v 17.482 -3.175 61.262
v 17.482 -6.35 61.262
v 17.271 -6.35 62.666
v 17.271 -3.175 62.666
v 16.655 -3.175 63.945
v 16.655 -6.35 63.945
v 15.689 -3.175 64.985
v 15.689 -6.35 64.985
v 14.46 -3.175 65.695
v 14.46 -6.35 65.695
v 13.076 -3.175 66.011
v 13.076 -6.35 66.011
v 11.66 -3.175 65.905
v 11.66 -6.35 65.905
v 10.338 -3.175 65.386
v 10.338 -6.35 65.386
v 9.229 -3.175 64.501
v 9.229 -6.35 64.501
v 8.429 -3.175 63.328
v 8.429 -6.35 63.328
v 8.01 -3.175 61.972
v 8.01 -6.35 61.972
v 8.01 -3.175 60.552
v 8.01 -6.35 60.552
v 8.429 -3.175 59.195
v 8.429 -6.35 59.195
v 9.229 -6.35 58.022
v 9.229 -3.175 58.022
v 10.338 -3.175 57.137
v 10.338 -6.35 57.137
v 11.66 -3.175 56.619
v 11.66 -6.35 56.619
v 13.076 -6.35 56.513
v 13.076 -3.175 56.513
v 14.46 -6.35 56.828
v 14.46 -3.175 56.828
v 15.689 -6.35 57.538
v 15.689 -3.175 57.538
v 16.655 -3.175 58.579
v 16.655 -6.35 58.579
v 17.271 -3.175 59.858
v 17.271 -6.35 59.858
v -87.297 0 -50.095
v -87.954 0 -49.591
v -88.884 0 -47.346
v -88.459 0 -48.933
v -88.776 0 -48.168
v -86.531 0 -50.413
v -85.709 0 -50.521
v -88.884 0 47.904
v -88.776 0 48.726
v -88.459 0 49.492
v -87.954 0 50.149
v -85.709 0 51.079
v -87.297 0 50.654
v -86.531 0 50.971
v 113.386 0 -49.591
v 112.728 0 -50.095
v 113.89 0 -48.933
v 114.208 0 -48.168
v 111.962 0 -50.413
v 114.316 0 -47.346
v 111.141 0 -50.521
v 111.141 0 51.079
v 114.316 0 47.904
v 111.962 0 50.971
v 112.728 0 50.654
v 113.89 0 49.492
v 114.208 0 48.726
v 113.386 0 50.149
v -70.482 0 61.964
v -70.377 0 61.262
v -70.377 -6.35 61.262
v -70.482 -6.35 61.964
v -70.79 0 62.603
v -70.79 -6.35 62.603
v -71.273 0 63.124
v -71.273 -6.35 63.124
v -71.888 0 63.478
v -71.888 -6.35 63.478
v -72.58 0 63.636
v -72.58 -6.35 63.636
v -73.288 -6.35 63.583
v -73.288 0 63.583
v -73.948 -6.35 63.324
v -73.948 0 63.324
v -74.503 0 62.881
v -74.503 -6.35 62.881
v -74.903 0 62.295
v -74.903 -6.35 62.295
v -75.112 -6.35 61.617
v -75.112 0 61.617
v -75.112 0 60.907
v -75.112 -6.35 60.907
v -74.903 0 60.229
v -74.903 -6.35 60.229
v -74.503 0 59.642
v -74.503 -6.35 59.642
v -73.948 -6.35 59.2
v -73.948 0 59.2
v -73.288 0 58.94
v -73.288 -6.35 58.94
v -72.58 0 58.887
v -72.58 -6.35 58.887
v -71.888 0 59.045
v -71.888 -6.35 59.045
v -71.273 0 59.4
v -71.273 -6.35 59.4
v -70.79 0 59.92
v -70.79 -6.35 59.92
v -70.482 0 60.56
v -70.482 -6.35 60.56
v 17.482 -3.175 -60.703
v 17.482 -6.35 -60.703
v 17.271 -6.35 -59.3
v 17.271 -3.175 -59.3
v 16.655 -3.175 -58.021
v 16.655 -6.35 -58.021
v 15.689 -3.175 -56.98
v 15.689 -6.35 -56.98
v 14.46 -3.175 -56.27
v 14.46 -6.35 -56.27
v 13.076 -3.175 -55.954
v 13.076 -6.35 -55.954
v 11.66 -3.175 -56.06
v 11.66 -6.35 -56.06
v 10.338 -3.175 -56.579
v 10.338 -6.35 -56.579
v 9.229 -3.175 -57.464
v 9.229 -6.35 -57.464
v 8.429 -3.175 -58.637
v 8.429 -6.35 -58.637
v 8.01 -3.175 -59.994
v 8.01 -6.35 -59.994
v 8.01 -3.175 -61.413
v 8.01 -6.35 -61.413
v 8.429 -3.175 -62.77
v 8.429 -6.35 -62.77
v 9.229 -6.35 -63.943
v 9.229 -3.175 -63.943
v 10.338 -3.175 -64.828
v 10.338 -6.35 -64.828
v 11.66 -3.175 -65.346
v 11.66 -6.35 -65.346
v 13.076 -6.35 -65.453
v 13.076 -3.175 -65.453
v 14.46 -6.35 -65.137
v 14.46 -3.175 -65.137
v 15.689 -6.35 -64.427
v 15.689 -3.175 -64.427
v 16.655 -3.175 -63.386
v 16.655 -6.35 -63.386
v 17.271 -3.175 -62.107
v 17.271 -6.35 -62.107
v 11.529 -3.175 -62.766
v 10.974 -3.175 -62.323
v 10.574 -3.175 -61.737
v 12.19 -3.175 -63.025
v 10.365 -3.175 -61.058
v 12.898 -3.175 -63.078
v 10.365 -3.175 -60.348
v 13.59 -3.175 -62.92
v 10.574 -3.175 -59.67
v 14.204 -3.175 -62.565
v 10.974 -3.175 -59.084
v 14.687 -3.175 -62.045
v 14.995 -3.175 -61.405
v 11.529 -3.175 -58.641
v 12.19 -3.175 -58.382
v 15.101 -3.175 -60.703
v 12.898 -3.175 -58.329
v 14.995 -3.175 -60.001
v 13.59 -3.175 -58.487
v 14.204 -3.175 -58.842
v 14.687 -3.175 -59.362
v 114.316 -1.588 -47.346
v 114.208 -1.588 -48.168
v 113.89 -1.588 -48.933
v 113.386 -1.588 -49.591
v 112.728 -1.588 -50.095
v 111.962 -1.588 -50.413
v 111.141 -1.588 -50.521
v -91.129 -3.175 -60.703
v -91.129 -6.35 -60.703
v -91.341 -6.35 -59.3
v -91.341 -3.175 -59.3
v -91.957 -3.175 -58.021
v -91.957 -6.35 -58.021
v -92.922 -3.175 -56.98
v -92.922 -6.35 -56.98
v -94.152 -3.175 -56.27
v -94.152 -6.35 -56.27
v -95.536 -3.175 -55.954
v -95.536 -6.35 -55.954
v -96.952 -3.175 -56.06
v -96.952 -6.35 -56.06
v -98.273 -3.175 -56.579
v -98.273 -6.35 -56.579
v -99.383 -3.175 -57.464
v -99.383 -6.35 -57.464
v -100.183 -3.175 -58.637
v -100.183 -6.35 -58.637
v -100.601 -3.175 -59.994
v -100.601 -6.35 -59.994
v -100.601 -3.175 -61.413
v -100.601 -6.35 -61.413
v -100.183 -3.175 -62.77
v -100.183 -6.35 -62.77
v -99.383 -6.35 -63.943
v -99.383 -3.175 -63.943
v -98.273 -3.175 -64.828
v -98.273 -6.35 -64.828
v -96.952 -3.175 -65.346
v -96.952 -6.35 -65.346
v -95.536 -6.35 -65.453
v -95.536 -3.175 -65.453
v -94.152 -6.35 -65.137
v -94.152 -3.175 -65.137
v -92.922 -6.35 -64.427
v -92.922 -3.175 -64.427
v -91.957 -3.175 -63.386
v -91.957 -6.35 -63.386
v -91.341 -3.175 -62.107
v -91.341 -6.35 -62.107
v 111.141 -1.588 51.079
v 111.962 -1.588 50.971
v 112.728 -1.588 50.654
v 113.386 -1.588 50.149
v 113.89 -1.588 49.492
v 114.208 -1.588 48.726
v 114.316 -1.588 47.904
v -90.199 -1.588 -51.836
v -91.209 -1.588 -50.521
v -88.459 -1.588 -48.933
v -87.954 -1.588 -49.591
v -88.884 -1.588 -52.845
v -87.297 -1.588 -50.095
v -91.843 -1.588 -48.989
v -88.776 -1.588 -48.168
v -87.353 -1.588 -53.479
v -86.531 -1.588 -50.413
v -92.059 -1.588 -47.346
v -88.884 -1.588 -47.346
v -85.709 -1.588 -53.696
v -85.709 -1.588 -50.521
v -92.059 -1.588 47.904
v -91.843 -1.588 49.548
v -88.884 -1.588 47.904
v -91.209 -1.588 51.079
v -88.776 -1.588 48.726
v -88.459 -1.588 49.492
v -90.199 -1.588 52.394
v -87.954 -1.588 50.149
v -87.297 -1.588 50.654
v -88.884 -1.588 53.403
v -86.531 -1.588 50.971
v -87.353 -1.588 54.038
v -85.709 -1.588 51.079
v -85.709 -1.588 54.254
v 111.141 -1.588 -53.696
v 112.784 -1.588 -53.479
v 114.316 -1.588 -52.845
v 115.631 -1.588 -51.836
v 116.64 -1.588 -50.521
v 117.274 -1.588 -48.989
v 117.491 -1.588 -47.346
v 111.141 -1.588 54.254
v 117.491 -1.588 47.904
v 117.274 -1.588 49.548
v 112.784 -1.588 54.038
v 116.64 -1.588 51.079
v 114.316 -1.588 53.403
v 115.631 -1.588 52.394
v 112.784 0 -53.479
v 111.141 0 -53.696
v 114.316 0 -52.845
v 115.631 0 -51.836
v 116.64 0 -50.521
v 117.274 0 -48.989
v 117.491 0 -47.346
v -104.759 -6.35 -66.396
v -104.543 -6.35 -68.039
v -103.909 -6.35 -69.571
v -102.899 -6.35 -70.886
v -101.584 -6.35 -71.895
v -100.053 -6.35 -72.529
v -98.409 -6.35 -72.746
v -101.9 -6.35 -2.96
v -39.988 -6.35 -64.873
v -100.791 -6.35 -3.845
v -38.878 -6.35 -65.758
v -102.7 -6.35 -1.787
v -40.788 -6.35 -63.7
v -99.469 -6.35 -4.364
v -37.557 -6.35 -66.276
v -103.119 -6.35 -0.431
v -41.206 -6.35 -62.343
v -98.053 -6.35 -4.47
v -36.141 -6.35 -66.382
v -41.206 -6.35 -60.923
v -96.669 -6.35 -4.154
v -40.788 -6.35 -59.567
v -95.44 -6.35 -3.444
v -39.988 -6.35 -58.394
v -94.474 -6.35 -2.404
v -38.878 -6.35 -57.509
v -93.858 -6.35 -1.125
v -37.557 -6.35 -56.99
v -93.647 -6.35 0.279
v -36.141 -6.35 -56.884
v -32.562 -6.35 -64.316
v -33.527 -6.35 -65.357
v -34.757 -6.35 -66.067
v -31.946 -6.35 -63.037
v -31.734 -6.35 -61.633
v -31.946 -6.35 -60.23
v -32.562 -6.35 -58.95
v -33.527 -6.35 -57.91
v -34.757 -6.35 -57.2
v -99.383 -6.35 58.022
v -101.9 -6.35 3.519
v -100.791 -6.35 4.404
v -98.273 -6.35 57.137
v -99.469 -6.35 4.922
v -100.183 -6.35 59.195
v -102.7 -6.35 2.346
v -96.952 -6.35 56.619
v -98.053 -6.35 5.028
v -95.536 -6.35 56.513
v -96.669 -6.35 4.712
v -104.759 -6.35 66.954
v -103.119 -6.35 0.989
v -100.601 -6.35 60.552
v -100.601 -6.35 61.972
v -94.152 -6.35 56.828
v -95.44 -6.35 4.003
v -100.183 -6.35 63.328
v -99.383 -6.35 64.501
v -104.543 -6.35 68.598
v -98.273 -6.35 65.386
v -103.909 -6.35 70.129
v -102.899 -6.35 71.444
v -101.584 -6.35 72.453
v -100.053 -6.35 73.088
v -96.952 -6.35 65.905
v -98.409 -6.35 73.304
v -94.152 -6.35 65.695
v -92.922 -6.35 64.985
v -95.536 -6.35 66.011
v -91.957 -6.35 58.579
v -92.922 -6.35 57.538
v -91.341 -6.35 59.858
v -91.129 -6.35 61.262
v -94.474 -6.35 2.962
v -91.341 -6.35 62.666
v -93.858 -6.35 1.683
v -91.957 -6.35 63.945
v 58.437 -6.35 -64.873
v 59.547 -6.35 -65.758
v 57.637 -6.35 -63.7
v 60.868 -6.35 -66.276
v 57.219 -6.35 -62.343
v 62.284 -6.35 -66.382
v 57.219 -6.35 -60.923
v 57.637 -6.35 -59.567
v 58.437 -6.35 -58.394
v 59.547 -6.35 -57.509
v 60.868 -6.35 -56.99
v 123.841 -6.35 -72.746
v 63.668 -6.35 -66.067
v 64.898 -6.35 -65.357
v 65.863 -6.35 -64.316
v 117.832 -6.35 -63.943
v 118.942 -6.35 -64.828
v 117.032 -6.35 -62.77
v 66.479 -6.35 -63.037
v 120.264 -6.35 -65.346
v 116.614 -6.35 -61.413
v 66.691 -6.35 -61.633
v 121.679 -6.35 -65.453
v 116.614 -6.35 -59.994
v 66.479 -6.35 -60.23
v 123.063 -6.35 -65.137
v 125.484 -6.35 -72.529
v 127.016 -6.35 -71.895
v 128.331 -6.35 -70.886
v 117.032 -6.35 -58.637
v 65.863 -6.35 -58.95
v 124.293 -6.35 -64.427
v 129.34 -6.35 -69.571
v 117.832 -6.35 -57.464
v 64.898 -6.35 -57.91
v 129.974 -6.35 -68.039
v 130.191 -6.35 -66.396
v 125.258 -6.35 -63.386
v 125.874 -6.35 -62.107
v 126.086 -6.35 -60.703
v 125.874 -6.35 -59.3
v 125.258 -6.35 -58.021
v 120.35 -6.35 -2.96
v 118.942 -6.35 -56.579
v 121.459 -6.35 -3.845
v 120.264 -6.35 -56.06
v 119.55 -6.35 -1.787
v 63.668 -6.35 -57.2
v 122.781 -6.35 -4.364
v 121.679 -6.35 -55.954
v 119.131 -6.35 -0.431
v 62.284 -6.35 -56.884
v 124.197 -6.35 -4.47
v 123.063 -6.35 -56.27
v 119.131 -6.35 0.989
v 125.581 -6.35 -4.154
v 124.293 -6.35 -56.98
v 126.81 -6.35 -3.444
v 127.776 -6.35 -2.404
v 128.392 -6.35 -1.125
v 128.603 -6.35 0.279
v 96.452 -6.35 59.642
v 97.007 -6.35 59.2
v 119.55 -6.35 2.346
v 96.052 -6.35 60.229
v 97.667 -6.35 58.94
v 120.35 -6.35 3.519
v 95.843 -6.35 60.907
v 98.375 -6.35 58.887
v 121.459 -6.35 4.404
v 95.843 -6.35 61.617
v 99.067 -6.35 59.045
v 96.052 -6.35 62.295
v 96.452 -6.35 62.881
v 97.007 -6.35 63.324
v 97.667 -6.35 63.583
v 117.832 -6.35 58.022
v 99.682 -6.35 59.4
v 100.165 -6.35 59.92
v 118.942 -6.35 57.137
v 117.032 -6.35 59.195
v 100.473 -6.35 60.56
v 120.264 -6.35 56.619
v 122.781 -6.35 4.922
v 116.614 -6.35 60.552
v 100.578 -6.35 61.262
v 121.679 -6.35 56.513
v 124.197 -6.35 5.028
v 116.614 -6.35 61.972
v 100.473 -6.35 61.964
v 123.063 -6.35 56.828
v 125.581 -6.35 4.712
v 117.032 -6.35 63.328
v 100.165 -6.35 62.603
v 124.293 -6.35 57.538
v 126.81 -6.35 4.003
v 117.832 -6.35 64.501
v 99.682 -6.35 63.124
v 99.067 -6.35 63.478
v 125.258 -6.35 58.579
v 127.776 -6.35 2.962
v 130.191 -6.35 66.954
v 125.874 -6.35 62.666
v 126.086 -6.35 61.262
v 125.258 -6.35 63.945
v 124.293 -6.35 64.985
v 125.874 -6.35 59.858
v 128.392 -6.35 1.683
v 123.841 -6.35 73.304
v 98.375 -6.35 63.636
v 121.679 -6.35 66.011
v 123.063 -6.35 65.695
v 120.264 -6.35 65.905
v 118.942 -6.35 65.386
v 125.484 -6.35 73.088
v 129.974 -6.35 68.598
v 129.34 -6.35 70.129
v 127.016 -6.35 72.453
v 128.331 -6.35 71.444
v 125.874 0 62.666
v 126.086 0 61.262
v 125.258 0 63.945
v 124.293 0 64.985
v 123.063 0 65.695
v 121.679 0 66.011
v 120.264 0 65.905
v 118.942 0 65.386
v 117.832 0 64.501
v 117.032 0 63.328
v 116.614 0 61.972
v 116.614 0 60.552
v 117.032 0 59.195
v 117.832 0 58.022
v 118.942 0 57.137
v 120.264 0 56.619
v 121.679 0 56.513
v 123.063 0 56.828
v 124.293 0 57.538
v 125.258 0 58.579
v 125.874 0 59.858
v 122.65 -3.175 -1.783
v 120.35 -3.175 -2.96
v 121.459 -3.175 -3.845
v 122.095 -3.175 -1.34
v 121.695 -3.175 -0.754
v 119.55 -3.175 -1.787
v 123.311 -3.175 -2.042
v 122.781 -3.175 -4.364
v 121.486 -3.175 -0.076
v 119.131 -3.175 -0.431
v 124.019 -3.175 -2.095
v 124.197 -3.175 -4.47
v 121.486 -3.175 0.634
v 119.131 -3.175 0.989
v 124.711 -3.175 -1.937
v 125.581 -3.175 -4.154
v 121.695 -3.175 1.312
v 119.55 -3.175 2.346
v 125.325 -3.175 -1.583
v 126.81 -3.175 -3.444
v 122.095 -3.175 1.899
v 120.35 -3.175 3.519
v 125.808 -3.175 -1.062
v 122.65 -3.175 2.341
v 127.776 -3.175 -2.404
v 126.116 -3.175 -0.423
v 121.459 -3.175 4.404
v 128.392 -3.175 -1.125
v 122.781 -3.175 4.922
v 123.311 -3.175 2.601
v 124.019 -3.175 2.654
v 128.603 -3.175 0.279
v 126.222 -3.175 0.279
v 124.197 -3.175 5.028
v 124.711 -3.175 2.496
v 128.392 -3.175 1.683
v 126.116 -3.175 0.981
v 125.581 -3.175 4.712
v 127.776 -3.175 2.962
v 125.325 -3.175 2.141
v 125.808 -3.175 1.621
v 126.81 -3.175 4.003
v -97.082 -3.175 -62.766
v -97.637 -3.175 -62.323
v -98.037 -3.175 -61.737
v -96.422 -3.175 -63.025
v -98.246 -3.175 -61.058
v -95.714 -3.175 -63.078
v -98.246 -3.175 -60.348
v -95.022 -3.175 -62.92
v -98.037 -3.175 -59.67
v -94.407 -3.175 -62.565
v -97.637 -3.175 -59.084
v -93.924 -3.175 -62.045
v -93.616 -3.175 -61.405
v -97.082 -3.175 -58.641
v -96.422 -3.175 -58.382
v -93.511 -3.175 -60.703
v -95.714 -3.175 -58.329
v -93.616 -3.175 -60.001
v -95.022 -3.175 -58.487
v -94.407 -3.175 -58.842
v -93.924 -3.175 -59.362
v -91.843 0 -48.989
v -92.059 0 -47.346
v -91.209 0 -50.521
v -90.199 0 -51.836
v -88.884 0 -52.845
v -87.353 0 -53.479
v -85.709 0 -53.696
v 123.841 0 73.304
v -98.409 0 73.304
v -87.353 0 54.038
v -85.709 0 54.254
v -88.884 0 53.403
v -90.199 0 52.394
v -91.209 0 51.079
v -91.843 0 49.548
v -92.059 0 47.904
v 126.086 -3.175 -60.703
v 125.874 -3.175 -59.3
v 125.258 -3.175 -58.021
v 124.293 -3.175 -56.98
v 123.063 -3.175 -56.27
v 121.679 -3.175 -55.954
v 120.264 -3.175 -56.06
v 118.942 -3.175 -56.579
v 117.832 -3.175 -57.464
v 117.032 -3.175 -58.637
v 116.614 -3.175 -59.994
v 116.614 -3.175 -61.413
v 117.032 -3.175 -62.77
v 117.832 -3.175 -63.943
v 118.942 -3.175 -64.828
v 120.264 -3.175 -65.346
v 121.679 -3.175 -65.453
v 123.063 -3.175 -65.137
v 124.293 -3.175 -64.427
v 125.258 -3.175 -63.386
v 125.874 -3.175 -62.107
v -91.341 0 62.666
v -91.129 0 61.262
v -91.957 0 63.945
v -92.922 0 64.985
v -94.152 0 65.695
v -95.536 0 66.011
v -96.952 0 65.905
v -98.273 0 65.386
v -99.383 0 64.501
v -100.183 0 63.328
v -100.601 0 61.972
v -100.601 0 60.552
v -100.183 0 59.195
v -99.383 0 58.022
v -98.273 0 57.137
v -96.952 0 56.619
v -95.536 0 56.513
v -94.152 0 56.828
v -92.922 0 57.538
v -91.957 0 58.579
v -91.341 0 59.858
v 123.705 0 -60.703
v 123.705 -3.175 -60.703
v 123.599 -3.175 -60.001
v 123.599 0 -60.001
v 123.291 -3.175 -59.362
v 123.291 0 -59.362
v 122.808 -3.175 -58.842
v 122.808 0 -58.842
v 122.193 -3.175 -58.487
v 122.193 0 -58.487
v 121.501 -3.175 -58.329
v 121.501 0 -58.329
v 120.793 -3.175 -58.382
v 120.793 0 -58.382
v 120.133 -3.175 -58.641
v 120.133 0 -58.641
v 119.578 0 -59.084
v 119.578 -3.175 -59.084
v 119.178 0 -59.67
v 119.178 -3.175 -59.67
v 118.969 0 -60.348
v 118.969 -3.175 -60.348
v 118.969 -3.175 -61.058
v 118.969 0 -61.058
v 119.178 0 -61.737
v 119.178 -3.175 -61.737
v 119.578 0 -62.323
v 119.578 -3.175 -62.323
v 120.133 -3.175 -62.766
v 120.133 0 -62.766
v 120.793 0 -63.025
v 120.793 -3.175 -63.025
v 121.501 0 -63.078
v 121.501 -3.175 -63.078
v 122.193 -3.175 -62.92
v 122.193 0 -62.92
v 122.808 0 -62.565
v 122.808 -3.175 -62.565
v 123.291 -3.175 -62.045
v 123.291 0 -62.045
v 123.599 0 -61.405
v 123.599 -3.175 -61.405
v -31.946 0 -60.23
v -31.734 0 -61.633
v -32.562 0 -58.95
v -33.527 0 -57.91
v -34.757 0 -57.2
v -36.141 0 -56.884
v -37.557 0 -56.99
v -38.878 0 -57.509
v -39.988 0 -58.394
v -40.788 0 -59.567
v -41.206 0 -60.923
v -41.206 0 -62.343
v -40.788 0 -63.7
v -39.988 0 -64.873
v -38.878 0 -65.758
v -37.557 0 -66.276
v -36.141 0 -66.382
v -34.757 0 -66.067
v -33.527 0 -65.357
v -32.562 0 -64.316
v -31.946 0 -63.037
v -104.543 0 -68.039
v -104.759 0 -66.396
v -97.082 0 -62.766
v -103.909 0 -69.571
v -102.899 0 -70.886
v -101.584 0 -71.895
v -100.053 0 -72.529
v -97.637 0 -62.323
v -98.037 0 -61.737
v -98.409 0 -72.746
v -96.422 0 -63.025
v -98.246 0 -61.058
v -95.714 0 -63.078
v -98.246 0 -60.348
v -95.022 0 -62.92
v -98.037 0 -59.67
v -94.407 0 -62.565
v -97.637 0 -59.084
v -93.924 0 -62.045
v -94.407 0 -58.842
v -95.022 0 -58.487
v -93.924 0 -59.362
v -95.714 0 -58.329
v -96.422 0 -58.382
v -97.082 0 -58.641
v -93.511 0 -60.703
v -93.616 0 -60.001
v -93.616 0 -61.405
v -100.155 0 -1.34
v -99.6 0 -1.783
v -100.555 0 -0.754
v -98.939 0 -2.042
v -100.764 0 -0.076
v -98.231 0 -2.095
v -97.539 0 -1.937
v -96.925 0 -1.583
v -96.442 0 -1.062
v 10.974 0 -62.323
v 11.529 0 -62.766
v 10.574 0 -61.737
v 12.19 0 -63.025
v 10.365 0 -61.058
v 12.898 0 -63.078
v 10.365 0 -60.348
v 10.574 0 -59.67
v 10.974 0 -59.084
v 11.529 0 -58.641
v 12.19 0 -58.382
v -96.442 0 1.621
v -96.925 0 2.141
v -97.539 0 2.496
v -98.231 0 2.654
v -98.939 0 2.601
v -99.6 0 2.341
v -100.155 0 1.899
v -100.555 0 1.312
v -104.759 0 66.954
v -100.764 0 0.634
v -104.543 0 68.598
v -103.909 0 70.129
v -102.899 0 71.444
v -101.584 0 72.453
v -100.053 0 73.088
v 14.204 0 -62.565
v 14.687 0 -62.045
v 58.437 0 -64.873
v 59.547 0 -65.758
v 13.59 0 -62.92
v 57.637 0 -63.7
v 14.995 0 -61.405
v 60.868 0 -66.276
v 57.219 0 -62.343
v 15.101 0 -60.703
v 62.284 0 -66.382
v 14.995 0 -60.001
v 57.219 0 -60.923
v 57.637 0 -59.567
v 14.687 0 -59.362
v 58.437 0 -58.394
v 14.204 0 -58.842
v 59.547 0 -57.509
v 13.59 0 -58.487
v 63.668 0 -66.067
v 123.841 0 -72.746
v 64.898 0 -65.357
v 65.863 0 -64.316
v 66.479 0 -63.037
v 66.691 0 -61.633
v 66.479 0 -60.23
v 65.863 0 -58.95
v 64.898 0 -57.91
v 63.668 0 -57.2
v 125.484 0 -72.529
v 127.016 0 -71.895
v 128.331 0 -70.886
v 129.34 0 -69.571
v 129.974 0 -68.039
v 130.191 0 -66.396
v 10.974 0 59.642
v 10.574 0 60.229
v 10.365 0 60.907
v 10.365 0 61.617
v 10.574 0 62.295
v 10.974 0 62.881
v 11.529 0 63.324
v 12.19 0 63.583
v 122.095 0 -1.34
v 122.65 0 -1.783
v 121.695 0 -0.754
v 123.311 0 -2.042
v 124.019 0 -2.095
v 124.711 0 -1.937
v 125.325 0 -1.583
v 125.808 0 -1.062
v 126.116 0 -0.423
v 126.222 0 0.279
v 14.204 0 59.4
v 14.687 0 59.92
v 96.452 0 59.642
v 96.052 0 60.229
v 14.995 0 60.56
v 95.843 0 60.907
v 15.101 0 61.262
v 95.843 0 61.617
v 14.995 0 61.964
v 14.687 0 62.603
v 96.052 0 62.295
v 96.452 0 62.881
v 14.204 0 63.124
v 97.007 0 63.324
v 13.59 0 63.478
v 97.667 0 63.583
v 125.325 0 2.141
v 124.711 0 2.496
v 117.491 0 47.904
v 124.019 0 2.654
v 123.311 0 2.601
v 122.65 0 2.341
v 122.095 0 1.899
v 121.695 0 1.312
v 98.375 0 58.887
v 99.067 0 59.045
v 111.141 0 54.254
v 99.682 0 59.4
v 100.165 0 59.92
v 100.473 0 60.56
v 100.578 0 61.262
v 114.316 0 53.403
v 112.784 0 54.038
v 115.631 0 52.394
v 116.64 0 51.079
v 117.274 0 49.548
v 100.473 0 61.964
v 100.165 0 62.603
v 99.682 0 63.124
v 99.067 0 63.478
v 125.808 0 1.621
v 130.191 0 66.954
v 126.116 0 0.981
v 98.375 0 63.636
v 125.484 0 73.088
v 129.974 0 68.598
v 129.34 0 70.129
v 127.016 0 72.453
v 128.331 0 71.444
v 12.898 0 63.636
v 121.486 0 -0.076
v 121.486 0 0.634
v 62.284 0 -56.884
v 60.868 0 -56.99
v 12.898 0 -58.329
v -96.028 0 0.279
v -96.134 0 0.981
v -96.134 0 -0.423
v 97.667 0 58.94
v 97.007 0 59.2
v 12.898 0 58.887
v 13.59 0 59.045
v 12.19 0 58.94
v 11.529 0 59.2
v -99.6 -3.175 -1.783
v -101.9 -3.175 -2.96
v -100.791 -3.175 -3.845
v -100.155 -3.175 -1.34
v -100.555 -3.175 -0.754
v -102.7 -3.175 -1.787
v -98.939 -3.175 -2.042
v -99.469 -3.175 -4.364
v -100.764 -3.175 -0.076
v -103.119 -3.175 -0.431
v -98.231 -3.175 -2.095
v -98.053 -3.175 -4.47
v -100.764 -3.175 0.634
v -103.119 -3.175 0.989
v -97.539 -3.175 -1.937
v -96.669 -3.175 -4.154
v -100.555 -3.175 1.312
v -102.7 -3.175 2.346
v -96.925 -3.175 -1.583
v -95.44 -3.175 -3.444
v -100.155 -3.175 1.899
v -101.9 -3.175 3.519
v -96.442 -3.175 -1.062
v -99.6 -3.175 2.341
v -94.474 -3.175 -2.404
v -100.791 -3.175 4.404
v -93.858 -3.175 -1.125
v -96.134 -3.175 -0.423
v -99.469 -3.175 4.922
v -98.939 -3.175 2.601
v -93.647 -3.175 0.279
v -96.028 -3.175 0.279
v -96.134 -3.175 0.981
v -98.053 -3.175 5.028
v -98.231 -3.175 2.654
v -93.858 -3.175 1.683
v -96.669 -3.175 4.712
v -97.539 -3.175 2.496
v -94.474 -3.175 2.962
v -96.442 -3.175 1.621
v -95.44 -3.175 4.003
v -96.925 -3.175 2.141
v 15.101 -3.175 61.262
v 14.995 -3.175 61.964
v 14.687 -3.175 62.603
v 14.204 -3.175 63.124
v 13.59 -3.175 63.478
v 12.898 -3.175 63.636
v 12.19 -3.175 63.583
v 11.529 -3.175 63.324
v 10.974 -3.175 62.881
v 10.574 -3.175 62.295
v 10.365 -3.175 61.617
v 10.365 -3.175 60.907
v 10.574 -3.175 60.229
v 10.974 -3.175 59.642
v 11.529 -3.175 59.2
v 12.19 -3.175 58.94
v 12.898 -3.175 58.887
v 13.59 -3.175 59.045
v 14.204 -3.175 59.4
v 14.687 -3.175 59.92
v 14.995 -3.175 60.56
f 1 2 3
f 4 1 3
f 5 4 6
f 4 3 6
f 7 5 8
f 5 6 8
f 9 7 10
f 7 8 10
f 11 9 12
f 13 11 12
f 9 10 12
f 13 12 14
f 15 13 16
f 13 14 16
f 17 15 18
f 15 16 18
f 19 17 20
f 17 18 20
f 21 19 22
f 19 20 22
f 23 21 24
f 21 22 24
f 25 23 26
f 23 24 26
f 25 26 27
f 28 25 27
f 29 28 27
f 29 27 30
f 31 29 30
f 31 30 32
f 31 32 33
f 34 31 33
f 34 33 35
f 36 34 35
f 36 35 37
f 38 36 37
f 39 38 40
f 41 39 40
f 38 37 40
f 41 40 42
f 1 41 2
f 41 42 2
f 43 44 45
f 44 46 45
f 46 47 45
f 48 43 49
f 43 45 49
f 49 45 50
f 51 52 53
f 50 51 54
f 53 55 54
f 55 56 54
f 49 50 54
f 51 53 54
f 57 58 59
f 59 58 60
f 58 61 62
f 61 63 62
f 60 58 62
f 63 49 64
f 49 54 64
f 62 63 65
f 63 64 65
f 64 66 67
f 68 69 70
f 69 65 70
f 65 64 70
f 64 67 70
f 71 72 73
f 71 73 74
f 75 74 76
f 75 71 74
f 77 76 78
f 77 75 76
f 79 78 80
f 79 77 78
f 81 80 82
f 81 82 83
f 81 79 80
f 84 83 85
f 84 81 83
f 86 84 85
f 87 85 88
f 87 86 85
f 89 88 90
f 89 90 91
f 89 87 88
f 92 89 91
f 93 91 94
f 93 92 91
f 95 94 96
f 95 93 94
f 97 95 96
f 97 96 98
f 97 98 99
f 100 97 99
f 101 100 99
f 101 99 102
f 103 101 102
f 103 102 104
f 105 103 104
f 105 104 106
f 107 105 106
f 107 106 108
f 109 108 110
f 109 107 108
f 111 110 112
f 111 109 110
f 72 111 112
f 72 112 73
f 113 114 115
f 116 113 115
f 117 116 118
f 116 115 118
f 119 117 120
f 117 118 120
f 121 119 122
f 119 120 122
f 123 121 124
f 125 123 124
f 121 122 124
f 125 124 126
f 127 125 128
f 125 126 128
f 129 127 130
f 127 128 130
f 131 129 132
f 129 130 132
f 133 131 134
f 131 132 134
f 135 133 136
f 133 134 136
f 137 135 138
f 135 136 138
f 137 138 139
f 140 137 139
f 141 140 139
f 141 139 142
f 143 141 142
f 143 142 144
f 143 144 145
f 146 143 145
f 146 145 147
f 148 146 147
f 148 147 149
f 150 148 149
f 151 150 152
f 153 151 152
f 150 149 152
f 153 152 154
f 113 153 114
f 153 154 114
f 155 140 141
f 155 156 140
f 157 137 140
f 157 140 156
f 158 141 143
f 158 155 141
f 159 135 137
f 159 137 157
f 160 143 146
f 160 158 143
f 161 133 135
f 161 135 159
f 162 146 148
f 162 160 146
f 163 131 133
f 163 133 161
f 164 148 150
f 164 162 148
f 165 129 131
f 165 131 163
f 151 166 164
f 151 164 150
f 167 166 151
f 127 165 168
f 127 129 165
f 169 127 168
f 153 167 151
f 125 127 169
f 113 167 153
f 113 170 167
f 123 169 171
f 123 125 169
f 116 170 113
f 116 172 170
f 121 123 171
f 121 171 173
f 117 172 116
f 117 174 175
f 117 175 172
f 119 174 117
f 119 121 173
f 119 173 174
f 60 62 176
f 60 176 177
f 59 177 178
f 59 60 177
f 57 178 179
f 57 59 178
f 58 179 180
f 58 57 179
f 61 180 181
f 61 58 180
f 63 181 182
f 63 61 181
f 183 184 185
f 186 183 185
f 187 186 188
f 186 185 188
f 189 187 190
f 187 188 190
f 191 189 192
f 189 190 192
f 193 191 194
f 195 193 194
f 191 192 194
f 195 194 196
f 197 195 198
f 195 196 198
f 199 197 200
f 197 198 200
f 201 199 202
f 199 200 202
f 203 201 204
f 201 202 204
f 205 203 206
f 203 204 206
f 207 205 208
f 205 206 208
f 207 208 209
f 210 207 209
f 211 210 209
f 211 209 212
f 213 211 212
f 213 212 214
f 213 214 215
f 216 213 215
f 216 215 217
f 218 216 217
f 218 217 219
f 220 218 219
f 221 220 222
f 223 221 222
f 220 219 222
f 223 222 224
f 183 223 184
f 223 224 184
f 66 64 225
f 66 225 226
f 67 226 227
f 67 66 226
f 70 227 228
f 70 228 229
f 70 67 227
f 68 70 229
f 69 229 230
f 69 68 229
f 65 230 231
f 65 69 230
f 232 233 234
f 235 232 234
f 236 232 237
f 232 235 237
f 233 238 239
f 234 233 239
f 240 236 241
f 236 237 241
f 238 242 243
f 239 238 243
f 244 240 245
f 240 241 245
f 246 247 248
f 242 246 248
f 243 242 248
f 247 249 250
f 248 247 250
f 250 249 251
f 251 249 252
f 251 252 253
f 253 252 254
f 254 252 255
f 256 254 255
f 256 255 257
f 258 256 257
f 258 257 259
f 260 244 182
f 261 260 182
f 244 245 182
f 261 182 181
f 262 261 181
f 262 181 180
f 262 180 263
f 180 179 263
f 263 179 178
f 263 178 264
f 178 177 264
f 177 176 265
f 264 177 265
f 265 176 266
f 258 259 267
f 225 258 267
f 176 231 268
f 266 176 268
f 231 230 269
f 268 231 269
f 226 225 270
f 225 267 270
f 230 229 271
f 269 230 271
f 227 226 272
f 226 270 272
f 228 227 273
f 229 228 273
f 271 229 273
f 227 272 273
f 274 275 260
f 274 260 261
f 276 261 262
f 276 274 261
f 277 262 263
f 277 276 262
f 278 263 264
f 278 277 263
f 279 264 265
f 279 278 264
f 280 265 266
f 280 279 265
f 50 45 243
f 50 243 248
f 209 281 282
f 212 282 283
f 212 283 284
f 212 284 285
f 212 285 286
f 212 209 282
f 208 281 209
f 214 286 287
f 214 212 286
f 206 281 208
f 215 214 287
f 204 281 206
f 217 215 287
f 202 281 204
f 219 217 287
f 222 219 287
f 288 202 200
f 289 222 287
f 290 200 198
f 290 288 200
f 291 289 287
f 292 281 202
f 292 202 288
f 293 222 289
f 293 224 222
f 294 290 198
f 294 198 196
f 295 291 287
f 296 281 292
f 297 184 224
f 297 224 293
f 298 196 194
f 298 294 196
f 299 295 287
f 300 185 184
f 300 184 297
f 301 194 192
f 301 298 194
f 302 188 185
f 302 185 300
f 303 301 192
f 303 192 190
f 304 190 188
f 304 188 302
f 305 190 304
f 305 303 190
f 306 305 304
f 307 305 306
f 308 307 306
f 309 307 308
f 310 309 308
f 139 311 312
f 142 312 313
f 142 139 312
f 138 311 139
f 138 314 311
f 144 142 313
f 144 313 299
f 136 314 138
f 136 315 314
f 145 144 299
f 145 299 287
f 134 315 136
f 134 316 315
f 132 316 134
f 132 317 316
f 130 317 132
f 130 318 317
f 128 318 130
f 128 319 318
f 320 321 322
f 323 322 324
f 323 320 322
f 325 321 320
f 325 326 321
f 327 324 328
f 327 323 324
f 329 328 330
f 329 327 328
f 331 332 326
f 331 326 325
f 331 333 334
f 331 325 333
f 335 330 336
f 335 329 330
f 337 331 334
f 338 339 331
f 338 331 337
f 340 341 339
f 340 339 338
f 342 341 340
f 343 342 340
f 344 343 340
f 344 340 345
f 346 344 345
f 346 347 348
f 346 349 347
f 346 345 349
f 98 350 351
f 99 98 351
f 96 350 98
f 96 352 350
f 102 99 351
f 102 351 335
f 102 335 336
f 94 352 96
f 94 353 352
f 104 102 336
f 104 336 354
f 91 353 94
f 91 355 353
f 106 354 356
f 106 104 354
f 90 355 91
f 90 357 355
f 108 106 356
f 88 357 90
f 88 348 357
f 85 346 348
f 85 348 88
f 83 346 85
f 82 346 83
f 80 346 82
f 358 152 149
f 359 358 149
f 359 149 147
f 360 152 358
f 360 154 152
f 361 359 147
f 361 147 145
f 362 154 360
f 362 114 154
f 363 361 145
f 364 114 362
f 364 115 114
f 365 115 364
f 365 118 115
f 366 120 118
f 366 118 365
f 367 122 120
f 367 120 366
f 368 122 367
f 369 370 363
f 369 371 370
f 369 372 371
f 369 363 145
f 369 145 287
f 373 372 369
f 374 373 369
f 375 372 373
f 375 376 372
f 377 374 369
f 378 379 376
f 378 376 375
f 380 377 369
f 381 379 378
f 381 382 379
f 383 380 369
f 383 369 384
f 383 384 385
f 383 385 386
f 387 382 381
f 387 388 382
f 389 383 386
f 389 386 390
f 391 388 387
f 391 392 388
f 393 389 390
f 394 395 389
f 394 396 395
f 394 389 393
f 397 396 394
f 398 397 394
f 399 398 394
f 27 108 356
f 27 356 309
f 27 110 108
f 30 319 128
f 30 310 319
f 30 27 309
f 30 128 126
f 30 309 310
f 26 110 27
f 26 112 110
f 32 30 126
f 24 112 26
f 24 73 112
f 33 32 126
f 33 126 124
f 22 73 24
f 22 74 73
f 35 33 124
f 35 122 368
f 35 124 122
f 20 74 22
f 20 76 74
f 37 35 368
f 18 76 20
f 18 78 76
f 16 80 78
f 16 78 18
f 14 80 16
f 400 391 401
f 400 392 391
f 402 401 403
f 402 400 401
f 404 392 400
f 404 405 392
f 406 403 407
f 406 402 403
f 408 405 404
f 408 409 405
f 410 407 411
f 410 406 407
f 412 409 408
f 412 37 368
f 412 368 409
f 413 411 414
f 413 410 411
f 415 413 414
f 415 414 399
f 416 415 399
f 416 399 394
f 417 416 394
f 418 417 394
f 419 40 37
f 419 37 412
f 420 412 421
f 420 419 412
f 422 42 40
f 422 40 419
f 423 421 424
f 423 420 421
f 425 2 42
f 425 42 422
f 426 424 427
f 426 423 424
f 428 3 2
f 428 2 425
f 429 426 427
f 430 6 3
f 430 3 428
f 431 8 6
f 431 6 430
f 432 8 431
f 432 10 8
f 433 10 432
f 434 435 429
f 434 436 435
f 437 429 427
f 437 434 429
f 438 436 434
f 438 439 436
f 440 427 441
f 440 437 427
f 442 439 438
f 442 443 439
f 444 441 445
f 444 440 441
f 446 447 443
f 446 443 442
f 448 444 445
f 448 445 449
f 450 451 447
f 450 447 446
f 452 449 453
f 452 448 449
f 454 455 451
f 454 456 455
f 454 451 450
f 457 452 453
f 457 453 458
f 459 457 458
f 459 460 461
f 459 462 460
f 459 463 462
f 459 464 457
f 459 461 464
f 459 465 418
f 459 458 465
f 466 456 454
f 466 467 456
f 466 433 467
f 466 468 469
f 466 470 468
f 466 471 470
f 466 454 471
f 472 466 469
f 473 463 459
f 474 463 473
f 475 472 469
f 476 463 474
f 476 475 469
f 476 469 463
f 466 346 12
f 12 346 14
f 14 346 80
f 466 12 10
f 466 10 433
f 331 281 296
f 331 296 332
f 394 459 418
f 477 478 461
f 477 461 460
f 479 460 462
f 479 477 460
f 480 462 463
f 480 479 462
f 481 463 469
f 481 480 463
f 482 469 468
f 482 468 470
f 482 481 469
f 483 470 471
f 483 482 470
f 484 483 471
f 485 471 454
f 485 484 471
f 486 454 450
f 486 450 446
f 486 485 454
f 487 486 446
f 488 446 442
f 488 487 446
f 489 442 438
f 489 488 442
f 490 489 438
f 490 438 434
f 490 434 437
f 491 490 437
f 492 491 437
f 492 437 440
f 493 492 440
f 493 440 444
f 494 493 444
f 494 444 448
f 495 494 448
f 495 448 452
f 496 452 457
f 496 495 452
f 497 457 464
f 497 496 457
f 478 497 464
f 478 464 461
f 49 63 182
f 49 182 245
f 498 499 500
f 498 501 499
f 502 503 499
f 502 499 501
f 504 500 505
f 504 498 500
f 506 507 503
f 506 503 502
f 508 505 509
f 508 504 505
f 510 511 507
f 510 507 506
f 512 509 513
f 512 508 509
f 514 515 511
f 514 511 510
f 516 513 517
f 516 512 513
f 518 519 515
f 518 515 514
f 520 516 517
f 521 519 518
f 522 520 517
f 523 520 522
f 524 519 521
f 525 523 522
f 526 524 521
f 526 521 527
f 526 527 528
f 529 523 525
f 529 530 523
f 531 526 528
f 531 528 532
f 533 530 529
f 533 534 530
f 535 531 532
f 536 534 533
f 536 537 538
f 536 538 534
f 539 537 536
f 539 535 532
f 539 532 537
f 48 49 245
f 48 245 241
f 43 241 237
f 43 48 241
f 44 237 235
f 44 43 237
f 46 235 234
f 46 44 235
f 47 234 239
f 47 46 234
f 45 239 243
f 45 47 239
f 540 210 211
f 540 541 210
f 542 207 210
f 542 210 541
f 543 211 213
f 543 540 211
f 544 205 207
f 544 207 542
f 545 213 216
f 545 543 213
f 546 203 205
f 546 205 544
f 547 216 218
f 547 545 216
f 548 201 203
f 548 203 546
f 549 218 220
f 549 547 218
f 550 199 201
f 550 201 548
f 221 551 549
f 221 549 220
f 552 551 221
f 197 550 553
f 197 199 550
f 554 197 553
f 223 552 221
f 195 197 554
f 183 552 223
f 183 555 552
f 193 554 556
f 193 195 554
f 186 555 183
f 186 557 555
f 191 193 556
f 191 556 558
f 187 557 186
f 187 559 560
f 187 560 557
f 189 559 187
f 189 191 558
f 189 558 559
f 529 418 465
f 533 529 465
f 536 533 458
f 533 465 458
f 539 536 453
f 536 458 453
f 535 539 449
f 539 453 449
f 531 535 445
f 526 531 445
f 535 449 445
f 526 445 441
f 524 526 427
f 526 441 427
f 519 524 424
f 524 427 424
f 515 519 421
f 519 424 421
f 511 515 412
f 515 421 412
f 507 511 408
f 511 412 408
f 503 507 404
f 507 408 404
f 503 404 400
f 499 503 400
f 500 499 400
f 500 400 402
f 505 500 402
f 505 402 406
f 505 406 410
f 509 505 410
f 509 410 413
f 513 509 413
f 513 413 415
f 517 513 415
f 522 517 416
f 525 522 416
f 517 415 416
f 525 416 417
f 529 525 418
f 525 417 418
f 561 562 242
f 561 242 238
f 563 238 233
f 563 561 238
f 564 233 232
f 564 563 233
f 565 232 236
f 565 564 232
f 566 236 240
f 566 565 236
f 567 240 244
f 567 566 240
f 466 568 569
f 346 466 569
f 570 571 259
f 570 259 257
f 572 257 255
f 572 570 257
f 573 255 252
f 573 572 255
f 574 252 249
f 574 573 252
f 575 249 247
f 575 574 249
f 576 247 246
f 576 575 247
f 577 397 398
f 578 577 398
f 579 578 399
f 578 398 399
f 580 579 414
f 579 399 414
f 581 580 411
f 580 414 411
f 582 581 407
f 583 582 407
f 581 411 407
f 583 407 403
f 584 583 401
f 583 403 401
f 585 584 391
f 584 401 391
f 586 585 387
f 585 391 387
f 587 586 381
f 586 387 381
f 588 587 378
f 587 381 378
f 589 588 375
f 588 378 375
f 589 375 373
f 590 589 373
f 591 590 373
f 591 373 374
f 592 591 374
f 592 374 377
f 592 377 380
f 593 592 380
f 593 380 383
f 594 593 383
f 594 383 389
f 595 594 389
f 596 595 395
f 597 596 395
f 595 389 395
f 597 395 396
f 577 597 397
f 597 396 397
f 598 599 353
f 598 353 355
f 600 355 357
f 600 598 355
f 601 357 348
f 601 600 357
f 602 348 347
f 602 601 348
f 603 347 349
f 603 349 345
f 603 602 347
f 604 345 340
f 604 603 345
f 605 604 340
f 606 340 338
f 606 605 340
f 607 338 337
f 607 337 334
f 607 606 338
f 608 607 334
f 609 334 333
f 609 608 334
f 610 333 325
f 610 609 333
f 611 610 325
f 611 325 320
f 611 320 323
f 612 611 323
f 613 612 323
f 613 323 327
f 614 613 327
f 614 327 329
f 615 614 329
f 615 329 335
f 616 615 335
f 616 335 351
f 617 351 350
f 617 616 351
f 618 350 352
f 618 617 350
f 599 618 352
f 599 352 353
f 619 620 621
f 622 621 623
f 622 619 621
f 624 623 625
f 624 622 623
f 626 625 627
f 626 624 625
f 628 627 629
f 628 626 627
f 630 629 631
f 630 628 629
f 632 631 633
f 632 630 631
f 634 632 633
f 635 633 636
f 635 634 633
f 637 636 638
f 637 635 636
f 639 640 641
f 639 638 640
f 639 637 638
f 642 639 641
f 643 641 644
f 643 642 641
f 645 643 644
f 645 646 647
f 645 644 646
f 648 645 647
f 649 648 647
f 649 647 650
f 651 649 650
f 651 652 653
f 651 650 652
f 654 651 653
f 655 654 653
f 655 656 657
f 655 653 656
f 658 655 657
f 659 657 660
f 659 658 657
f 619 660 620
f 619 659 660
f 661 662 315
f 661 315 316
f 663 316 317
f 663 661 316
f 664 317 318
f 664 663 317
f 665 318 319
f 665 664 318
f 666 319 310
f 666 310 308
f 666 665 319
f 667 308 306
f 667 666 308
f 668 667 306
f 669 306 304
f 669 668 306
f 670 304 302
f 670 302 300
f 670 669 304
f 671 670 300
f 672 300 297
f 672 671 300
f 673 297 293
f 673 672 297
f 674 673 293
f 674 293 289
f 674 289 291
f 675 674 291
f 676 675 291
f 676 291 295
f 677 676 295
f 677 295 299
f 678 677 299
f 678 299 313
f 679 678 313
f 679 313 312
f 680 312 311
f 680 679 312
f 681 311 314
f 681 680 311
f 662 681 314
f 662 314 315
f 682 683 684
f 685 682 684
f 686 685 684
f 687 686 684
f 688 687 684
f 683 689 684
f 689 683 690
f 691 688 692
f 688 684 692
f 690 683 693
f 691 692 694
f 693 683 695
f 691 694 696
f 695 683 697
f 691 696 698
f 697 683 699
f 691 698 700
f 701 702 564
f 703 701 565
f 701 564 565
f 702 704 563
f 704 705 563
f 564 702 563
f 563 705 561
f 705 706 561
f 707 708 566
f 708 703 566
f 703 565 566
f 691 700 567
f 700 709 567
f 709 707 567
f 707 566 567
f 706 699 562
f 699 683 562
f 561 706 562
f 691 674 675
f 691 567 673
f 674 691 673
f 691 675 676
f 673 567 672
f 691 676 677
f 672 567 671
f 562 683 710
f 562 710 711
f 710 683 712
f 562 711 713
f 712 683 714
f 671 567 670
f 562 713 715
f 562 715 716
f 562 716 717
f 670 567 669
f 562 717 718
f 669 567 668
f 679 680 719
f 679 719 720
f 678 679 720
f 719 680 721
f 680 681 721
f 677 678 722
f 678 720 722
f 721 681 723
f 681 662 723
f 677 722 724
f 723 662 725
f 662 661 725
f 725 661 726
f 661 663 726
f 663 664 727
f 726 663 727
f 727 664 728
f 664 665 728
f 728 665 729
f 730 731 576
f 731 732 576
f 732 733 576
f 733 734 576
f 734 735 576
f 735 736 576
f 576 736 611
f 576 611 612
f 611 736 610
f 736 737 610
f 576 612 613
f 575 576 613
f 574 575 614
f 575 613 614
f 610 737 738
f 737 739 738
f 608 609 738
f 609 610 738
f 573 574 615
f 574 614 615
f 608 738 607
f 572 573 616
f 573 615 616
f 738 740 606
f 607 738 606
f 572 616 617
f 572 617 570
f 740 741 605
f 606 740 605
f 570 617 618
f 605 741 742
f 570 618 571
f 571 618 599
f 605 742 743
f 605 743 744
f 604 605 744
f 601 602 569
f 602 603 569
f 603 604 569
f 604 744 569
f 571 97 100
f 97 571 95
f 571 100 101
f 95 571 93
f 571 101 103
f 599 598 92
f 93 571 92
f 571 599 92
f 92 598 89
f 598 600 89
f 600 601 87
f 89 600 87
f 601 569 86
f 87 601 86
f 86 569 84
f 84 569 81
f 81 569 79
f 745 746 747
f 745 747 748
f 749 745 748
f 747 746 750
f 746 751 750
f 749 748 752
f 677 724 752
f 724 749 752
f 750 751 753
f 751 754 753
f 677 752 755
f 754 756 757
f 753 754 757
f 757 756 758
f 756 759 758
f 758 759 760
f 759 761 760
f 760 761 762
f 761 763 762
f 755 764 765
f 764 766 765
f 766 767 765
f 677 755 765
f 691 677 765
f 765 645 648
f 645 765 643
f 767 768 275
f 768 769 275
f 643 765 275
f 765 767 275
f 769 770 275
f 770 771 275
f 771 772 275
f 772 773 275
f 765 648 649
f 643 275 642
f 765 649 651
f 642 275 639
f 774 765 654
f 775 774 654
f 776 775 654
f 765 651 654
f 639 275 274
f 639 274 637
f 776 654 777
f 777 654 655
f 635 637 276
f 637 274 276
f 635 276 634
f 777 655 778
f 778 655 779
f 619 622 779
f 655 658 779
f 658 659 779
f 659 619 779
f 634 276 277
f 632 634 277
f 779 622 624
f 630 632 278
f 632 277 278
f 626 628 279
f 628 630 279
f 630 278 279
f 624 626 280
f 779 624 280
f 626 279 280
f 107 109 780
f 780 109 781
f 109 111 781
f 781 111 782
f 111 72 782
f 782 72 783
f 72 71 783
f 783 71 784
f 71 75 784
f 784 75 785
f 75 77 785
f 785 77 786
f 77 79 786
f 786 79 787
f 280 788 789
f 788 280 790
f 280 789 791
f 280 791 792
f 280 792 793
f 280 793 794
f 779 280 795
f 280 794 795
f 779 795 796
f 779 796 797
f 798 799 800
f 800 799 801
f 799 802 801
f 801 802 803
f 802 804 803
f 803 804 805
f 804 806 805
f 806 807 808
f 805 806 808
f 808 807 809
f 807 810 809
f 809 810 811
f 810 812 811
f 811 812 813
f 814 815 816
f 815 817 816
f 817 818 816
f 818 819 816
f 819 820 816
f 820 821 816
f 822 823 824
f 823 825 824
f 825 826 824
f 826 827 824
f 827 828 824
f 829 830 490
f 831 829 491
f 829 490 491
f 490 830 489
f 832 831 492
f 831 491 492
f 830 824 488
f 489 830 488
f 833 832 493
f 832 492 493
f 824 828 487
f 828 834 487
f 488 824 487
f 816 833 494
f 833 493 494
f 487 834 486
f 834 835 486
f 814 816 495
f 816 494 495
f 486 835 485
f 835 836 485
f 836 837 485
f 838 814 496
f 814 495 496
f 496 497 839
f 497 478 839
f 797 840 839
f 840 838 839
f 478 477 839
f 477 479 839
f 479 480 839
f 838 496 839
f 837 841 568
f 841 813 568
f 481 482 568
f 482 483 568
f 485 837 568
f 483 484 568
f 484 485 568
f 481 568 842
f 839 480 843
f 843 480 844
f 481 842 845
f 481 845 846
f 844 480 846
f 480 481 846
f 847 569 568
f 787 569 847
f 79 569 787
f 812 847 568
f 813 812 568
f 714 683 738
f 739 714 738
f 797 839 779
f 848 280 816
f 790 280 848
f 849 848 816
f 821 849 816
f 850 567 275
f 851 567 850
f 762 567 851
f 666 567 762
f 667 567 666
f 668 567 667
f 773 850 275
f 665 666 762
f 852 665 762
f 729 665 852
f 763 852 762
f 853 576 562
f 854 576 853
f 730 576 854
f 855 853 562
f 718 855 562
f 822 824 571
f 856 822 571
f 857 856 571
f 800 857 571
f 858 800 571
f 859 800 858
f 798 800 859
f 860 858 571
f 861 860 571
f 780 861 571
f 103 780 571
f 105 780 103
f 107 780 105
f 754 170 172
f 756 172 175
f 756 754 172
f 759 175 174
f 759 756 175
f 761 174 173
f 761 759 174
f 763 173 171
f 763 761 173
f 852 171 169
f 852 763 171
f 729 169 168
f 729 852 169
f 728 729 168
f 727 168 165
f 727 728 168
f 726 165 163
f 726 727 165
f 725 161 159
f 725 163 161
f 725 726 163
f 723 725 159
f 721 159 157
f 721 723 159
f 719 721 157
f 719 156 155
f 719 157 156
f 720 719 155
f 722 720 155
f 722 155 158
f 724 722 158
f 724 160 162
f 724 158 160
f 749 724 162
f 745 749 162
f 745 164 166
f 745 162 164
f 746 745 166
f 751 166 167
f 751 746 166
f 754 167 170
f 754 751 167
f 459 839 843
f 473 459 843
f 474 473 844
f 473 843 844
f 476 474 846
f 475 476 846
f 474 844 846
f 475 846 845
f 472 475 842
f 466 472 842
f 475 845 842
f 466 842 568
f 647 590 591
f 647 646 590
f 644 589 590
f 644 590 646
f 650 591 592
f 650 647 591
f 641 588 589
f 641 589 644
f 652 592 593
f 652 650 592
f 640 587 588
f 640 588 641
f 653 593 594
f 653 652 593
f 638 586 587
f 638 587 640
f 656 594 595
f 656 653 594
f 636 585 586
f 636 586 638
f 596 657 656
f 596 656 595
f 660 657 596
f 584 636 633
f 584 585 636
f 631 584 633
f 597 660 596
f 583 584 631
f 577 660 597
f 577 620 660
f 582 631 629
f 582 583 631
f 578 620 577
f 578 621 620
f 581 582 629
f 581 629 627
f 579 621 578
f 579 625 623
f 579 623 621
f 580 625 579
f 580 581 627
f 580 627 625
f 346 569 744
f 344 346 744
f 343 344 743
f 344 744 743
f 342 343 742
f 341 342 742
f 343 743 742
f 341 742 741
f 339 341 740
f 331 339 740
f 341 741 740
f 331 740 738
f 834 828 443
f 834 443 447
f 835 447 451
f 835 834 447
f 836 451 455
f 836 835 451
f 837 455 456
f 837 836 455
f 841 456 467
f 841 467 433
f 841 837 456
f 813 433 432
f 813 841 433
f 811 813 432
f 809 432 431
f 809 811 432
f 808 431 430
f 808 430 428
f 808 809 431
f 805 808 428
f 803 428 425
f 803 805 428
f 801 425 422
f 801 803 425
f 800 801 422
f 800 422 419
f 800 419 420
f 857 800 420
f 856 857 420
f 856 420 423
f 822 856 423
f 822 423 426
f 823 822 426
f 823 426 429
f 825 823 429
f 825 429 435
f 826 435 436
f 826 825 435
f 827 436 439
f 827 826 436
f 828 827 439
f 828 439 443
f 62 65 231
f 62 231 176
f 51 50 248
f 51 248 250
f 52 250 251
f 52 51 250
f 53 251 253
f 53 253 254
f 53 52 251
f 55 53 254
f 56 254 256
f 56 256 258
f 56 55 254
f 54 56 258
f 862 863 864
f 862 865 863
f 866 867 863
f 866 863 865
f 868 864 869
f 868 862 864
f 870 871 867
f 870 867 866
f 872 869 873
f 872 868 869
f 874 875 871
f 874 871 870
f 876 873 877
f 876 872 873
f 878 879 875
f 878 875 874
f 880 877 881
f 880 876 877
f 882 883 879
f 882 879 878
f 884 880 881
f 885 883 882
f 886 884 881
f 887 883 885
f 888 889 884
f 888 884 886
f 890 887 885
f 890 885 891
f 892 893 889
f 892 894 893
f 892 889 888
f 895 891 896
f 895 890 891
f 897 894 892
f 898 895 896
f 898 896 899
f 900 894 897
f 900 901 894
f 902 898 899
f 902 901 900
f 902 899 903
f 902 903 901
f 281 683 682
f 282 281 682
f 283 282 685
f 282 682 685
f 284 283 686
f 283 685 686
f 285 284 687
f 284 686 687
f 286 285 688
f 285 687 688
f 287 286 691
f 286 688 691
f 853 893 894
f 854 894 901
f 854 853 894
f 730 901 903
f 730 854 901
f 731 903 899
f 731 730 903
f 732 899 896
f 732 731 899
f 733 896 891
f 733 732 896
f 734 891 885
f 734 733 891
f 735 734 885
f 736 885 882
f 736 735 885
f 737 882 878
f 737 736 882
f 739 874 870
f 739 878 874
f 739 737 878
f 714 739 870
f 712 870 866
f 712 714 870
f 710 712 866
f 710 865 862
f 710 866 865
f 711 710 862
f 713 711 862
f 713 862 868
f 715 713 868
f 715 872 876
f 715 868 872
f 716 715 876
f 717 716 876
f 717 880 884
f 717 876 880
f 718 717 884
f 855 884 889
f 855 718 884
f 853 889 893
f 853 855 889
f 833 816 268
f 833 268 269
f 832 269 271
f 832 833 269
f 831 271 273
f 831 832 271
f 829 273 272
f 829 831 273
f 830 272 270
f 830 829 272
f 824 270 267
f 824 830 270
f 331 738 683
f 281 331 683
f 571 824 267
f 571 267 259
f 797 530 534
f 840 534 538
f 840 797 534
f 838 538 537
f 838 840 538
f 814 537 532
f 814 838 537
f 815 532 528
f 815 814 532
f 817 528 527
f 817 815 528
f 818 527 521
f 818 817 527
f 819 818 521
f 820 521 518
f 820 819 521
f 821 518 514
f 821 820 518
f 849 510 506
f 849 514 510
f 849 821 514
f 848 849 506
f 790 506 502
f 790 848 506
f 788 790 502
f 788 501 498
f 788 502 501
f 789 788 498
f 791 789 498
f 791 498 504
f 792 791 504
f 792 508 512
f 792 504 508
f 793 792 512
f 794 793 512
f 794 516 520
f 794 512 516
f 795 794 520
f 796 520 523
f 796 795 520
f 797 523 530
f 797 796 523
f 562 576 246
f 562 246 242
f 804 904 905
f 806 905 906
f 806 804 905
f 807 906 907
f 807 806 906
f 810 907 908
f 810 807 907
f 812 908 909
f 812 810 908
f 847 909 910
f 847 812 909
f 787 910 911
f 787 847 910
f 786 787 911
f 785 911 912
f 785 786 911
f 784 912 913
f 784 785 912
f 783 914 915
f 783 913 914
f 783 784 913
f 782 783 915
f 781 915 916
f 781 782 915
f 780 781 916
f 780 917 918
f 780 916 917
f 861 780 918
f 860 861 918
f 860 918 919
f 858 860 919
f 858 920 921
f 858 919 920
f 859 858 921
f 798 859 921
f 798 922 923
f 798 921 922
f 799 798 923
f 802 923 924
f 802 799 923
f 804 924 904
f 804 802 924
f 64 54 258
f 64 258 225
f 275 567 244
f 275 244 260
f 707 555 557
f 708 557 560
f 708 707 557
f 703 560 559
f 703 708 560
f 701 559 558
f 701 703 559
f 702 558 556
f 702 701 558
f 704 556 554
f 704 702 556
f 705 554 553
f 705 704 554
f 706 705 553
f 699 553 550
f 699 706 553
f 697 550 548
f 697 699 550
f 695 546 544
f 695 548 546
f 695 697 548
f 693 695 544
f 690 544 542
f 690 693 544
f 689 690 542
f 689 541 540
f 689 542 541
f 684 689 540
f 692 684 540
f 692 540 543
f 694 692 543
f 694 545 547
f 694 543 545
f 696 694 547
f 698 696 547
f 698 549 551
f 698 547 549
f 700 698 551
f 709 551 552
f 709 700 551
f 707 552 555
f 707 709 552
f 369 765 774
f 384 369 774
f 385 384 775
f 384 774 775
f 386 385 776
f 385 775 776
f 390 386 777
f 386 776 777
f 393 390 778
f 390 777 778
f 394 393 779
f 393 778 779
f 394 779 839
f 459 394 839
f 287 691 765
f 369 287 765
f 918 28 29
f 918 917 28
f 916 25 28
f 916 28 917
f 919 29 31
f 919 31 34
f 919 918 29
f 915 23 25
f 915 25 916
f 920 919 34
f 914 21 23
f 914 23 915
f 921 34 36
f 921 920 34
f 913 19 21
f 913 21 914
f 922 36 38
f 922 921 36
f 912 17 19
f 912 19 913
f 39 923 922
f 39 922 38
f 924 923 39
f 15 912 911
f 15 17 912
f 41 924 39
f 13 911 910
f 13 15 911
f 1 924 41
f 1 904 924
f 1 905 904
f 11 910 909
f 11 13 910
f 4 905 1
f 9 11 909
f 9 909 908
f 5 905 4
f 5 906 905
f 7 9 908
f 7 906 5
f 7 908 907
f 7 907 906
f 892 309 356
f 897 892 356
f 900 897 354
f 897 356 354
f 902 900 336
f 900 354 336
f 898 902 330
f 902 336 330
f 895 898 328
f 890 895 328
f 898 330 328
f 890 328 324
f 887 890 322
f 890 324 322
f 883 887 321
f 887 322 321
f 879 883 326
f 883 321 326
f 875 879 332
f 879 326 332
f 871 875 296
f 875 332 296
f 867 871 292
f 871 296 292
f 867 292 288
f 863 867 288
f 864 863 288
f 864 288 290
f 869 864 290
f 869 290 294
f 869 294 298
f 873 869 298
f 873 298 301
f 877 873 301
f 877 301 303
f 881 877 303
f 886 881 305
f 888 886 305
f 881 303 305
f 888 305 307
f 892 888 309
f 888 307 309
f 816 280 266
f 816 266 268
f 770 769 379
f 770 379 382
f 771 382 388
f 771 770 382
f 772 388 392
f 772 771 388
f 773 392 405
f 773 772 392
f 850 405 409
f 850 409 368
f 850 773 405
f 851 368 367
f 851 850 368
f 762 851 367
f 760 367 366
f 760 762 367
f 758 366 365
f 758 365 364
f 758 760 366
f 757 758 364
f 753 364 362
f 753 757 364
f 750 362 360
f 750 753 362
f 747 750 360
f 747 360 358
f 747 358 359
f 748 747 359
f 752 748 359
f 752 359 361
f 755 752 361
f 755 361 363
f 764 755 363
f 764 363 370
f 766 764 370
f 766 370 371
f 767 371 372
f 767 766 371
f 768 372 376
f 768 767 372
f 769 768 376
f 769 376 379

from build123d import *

# Parameters (mm, degrees)
F0_R     = 2.38125
F0_R_2   = 4.7625
F1_DEPTH = 6.35
F2_R     = 4.7625
F3_DEPTH = 3.175
F5_DEPTH = 1.5875


with BuildPart() as f1:
    # F0 (on Front) → F1 (new body)
    with BuildSketch(Plane.XZ):
        with BuildLine():
            Line((123.840723, 73.304202), (-98.409277, 73.304202))
            ThreePointArc((-98.409277, 73.304202), (-102.899405, 71.44433), (-104.759277, 66.954202))
            Line((-104.759277, 66.954202), (-104.759277, -66.395798))
            ThreePointArc((-104.759277, -66.395798), (-102.899405, -70.885926), (-98.409277, -72.745798))
            Line((-98.409277, -72.745798), (123.840723, -72.745798))
            ThreePointArc((123.840723, -72.745798), (128.330851, -70.885926), (130.190723, -66.395798))
            Line((130.190723, -66.395798), (130.190723, 66.954202))
            ThreePointArc((130.190723, 66.954202), (128.330851, 71.44433), (123.840723, 73.304202))
        make_face()
        with Locations((-95.891841, -60.703362)):
            Circle(F0_R, mode=Mode.SUBTRACT)
        with Locations((-36.496777, -61.633298)):
            Circle(F0_R_2, mode=Mode.SUBTRACT)
        with Locations((12.719704, -60.703362)):
            Circle(F0_R, mode=Mode.SUBTRACT)
        with Locations((61.928223, -61.633298)):
            Circle(F0_R_2, mode=Mode.SUBTRACT)
        with Locations((121.323287, -60.703362)):
            Circle(F0_R, mode=Mode.SUBTRACT)
        with Locations((-98.409277, 0.279202)):
            Circle(F0_R, mode=Mode.SUBTRACT)
        with Locations((-95.891841, 61.261766)):
            Circle(F0_R_2, mode=Mode.SUBTRACT)
        with Locations((-72.757799, 61.261766)):
            Circle(F0_R, mode=Mode.SUBTRACT)
        with Locations((123.840723, 0.279202)):
            Circle(F0_R, mode=Mode.SUBTRACT)
        with Locations((12.719704, 61.261766)):
            Circle(F0_R, mode=Mode.SUBTRACT)
        with Locations((98.197206, 61.261766)):
            Circle(F0_R, mode=Mode.SUBTRACT)
        with Locations((121.323287, 61.261766)):
            Circle(F0_R_2, mode=Mode.SUBTRACT)
    extrude(amount=F1_DEPTH)

    # F2 (on face) → F3 (cut)
    with BuildSketch(Plane.XZ.offset(6.35)):
        with Locations((-98.409277, 0.279202)):
            Circle(F2_R)
        with Locations((12.719704, 61.261766)):
            Circle(F2_R)
        with Locations((123.840723, 0.279202)):
            Circle(F2_R)
        with Locations((121.323287, -60.703362)):
            Circle(F2_R)
        with Locations((12.719704, -60.703362)):
            Circle(F2_R)
        with Locations((-95.891841, -60.703362)):
            Circle(F2_R)
    extrude(amount=-F3_DEPTH, mode=Mode.SUBTRACT)

    # F4 (on face) → F5 (cut)
    with BuildSketch(Plane.XZ):
        with BuildLine():
            Line((117.490723, -47.345798), (117.490723, 47.904202))
            ThreePointArc((117.490723, 47.904202), (115.630851, 52.39433), (111.140723, 54.254202))
            Line((111.140723, 54.254202), (-85.709277, 54.254202))
            ThreePointArc((-85.709277, 54.254202), (-90.199405, 52.39433), (-92.059277, 47.904202))
            Line((-92.059277, 47.904202), (-92.059277, -47.345798))
            ThreePointArc((-92.059277, -47.345798), (-90.199405, -51.835926), (-85.709277, -53.695798))
            Line((-85.709277, -53.695798), (111.140723, -53.695798))
            ThreePointArc((111.140723, -53.695798), (115.630851, -51.835926), (117.490723, -47.345798))
        make_face()
        with BuildLine():
            ThreePointArc((111.140723, 51.079202), (113.385787, 50.149266), (114.315723, 47.904202))
            Line((114.315723, 47.904202), (114.315723, -47.345798))
            ThreePointArc((114.315723, -47.345798), (113.385787, -49.590862), (111.140723, -50.520798))
            Line((111.140723, -50.520798), (-85.709277, -50.520798))
            ThreePointArc((-85.709277, -50.520798), (-87.954341, -49.590862), (-88.884277, -47.345798))
            Line((-88.884277, -47.345798), (-88.884277, 47.904202))
            ThreePointArc((-88.884277, 47.904202), (-87.954341, 50.149266), (-85.709277, 51.079202))
            Line((-85.709277, 51.079202), (111.140723, 51.079202))
        make_face(mode=Mode.SUBTRACT)
    extrude(amount=F5_DEPTH, mode=Mode.SUBTRACT)


solid = f1.part
